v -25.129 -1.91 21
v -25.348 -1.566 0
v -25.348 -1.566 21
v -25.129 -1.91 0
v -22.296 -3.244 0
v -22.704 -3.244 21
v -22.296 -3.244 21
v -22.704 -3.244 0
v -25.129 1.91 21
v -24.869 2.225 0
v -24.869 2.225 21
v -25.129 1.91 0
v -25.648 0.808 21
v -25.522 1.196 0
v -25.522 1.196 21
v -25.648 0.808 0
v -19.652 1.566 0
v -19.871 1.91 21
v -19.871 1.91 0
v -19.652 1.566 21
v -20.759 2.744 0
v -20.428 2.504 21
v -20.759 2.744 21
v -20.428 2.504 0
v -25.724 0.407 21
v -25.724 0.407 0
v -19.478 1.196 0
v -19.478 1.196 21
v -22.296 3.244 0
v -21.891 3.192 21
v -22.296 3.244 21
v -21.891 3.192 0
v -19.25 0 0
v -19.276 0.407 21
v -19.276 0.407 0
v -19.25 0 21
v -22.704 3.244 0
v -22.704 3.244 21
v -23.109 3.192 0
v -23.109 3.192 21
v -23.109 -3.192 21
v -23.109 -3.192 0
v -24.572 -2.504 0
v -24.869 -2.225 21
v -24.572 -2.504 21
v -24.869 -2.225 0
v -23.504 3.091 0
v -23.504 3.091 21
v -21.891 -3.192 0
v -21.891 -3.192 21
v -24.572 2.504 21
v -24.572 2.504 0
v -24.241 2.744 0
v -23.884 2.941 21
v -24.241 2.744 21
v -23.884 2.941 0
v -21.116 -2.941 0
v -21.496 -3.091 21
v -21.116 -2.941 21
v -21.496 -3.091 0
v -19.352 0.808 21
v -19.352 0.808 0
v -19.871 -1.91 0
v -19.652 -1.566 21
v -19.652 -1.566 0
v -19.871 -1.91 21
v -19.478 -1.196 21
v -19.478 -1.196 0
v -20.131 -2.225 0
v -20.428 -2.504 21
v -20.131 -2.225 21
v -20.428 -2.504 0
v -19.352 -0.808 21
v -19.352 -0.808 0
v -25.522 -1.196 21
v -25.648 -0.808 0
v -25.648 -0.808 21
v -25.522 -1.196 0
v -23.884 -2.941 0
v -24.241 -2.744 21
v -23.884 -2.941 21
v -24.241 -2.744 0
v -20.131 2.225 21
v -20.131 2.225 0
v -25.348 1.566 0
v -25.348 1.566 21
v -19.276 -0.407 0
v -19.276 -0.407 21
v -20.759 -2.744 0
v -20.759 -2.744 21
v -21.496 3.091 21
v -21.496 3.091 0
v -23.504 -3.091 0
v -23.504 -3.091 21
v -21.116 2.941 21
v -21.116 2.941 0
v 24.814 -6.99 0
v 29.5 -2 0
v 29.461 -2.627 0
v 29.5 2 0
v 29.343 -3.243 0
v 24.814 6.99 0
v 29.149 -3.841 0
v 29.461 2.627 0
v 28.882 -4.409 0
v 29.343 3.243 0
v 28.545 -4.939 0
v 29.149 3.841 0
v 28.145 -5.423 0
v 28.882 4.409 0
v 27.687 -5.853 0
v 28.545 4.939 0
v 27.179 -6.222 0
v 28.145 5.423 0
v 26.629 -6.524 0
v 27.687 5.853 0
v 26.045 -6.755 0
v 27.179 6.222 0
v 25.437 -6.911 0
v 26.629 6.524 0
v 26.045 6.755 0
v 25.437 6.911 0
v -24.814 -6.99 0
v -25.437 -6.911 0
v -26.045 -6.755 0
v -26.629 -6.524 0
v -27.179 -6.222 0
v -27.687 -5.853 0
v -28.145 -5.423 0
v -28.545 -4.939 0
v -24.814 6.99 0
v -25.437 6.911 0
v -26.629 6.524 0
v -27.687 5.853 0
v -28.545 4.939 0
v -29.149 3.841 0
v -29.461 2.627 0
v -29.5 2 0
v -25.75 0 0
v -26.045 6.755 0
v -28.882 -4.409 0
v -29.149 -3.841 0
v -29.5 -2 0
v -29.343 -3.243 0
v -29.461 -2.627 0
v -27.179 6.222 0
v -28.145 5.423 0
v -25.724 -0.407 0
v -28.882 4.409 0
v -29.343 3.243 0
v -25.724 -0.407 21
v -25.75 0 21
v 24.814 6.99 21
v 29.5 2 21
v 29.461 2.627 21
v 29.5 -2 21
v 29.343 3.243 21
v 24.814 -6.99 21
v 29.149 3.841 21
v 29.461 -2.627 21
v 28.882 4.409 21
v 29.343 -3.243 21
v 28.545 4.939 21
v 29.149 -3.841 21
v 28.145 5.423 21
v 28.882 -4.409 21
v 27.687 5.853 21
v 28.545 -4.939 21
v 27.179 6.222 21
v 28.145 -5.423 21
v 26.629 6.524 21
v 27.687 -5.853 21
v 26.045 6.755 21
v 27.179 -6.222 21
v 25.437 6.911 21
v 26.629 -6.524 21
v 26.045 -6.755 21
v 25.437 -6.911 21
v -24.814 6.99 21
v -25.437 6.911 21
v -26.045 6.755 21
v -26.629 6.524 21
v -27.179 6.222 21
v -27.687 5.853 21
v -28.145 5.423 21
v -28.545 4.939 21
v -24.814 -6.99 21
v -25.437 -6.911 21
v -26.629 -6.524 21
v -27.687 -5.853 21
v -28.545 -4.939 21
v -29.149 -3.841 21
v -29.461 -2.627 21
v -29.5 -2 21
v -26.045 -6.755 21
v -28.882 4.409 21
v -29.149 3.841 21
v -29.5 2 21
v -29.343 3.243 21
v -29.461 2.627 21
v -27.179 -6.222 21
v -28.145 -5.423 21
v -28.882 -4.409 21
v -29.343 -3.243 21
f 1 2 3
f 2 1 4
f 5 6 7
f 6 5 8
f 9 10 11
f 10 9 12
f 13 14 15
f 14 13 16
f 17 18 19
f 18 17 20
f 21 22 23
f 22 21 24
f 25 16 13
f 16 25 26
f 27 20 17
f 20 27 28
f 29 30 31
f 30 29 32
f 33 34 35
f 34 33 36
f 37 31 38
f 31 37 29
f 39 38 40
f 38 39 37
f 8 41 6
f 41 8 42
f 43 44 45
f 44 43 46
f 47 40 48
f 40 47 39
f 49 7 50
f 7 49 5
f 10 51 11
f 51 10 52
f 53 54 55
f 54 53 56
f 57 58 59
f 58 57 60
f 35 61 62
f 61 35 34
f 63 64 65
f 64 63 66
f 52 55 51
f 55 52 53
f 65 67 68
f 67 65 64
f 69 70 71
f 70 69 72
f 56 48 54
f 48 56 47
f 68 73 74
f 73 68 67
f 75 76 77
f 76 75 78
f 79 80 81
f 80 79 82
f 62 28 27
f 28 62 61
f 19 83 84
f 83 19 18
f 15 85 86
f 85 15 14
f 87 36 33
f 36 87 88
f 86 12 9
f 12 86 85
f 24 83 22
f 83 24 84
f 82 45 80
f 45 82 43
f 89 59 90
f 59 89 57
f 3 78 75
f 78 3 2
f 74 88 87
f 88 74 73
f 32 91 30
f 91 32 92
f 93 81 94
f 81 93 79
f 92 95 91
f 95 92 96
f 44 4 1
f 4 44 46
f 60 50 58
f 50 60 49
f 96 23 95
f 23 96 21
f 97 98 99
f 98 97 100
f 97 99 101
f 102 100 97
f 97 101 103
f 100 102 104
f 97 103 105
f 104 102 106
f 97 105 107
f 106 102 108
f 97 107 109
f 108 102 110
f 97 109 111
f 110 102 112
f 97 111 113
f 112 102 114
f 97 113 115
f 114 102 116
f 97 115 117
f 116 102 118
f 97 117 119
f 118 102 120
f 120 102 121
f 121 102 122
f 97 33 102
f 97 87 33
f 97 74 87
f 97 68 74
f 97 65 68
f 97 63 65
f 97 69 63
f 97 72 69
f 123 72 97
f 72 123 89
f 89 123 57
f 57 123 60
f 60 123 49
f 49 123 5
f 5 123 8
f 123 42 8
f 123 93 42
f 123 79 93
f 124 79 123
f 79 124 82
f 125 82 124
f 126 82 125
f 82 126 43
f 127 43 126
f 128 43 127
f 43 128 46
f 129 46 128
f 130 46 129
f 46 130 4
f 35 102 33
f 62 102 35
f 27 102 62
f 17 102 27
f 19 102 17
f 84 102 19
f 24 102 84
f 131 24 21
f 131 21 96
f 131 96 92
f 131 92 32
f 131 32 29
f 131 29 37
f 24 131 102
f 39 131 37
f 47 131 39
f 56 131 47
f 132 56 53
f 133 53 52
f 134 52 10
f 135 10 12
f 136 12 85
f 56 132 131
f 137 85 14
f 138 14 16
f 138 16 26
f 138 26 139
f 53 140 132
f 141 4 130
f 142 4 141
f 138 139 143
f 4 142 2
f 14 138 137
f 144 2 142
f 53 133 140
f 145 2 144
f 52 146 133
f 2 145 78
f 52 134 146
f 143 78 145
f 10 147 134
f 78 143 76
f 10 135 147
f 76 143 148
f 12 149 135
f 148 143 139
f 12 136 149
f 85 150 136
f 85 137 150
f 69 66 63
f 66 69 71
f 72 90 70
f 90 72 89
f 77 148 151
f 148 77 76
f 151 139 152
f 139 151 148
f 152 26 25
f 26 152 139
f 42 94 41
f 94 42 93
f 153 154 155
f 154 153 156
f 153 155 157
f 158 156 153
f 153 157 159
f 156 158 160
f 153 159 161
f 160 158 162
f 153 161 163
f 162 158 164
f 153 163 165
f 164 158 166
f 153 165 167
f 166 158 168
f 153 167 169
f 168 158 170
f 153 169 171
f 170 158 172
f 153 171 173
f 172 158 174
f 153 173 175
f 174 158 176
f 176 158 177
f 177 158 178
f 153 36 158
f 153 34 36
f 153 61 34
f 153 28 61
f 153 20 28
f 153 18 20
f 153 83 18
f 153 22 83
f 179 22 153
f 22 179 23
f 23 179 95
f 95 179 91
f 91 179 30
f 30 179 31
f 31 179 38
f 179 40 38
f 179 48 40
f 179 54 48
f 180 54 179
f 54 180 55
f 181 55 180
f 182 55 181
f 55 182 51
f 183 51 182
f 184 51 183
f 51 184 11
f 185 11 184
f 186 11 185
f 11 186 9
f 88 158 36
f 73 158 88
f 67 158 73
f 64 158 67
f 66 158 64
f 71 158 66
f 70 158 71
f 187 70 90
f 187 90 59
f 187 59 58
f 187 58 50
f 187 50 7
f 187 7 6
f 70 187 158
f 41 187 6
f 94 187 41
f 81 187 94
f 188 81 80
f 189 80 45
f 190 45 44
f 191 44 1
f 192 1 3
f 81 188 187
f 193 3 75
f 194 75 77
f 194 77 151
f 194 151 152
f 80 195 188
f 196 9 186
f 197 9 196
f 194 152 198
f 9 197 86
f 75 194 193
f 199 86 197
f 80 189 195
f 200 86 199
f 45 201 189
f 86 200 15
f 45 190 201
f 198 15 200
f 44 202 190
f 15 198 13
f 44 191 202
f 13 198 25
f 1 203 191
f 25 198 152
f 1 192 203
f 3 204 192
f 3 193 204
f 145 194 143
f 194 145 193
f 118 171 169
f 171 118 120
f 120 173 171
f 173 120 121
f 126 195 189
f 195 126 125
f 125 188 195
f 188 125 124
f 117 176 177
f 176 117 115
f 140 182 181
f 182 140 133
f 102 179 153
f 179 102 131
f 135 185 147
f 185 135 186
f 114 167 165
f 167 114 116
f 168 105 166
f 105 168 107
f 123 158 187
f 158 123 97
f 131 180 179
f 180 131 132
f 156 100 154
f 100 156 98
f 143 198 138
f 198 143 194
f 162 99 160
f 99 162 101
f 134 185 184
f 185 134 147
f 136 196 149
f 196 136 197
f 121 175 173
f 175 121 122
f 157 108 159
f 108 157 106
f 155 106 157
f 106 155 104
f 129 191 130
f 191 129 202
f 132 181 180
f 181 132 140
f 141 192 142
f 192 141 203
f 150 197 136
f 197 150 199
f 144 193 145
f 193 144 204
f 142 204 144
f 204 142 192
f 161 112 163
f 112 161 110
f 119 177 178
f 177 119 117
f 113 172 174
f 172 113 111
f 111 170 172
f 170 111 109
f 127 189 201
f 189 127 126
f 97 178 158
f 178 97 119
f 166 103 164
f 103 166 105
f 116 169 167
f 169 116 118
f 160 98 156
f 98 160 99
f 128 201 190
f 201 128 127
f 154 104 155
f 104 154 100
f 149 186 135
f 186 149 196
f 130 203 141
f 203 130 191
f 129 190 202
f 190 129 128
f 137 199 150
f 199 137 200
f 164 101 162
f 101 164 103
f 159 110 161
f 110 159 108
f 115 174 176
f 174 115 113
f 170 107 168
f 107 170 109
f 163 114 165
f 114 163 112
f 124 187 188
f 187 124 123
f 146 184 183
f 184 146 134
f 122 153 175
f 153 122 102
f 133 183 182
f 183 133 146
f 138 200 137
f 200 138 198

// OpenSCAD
$fn = 50;


difference() {
	union() {
		hull() {
			translate(v = [-24.5000000000, 2.0000000000, 0]) {
				cylinder(h = 21, r = 5);
			}
			translate(v = [24.5000000000, 2.0000000000, 0]) {
				cylinder(h = 21, r = 5);
			}
			translate(v = [-24.5000000000, -2.0000000000, 0]) {
				cylinder(h = 21, r = 5);
			}
			translate(v = [24.5000000000, -2.0000000000, 0]) {
				cylinder(h = 21, r = 5);
			}
		}
	}
	union() {
		translate(v = [-22.5000000000, 0.0000000000, 0]) {
			cylinder(h = 21, r = 3.2500000000);
		}
		translate(v = [-22.5000000000, 0.0000000000, 0]) {
			cylinder(h = 21, r = 1.8000000000);
		}
		translate(v = [-22.5000000000, 0.0000000000, 0]) {
			cylinder(h = 21, r = 1.8000000000);
		}
		translate(v = [-22.5000000000, 0.0000000000, 0]) {
			cylinder(h = 21, r = 1.8000000000);
		}
	}
}
